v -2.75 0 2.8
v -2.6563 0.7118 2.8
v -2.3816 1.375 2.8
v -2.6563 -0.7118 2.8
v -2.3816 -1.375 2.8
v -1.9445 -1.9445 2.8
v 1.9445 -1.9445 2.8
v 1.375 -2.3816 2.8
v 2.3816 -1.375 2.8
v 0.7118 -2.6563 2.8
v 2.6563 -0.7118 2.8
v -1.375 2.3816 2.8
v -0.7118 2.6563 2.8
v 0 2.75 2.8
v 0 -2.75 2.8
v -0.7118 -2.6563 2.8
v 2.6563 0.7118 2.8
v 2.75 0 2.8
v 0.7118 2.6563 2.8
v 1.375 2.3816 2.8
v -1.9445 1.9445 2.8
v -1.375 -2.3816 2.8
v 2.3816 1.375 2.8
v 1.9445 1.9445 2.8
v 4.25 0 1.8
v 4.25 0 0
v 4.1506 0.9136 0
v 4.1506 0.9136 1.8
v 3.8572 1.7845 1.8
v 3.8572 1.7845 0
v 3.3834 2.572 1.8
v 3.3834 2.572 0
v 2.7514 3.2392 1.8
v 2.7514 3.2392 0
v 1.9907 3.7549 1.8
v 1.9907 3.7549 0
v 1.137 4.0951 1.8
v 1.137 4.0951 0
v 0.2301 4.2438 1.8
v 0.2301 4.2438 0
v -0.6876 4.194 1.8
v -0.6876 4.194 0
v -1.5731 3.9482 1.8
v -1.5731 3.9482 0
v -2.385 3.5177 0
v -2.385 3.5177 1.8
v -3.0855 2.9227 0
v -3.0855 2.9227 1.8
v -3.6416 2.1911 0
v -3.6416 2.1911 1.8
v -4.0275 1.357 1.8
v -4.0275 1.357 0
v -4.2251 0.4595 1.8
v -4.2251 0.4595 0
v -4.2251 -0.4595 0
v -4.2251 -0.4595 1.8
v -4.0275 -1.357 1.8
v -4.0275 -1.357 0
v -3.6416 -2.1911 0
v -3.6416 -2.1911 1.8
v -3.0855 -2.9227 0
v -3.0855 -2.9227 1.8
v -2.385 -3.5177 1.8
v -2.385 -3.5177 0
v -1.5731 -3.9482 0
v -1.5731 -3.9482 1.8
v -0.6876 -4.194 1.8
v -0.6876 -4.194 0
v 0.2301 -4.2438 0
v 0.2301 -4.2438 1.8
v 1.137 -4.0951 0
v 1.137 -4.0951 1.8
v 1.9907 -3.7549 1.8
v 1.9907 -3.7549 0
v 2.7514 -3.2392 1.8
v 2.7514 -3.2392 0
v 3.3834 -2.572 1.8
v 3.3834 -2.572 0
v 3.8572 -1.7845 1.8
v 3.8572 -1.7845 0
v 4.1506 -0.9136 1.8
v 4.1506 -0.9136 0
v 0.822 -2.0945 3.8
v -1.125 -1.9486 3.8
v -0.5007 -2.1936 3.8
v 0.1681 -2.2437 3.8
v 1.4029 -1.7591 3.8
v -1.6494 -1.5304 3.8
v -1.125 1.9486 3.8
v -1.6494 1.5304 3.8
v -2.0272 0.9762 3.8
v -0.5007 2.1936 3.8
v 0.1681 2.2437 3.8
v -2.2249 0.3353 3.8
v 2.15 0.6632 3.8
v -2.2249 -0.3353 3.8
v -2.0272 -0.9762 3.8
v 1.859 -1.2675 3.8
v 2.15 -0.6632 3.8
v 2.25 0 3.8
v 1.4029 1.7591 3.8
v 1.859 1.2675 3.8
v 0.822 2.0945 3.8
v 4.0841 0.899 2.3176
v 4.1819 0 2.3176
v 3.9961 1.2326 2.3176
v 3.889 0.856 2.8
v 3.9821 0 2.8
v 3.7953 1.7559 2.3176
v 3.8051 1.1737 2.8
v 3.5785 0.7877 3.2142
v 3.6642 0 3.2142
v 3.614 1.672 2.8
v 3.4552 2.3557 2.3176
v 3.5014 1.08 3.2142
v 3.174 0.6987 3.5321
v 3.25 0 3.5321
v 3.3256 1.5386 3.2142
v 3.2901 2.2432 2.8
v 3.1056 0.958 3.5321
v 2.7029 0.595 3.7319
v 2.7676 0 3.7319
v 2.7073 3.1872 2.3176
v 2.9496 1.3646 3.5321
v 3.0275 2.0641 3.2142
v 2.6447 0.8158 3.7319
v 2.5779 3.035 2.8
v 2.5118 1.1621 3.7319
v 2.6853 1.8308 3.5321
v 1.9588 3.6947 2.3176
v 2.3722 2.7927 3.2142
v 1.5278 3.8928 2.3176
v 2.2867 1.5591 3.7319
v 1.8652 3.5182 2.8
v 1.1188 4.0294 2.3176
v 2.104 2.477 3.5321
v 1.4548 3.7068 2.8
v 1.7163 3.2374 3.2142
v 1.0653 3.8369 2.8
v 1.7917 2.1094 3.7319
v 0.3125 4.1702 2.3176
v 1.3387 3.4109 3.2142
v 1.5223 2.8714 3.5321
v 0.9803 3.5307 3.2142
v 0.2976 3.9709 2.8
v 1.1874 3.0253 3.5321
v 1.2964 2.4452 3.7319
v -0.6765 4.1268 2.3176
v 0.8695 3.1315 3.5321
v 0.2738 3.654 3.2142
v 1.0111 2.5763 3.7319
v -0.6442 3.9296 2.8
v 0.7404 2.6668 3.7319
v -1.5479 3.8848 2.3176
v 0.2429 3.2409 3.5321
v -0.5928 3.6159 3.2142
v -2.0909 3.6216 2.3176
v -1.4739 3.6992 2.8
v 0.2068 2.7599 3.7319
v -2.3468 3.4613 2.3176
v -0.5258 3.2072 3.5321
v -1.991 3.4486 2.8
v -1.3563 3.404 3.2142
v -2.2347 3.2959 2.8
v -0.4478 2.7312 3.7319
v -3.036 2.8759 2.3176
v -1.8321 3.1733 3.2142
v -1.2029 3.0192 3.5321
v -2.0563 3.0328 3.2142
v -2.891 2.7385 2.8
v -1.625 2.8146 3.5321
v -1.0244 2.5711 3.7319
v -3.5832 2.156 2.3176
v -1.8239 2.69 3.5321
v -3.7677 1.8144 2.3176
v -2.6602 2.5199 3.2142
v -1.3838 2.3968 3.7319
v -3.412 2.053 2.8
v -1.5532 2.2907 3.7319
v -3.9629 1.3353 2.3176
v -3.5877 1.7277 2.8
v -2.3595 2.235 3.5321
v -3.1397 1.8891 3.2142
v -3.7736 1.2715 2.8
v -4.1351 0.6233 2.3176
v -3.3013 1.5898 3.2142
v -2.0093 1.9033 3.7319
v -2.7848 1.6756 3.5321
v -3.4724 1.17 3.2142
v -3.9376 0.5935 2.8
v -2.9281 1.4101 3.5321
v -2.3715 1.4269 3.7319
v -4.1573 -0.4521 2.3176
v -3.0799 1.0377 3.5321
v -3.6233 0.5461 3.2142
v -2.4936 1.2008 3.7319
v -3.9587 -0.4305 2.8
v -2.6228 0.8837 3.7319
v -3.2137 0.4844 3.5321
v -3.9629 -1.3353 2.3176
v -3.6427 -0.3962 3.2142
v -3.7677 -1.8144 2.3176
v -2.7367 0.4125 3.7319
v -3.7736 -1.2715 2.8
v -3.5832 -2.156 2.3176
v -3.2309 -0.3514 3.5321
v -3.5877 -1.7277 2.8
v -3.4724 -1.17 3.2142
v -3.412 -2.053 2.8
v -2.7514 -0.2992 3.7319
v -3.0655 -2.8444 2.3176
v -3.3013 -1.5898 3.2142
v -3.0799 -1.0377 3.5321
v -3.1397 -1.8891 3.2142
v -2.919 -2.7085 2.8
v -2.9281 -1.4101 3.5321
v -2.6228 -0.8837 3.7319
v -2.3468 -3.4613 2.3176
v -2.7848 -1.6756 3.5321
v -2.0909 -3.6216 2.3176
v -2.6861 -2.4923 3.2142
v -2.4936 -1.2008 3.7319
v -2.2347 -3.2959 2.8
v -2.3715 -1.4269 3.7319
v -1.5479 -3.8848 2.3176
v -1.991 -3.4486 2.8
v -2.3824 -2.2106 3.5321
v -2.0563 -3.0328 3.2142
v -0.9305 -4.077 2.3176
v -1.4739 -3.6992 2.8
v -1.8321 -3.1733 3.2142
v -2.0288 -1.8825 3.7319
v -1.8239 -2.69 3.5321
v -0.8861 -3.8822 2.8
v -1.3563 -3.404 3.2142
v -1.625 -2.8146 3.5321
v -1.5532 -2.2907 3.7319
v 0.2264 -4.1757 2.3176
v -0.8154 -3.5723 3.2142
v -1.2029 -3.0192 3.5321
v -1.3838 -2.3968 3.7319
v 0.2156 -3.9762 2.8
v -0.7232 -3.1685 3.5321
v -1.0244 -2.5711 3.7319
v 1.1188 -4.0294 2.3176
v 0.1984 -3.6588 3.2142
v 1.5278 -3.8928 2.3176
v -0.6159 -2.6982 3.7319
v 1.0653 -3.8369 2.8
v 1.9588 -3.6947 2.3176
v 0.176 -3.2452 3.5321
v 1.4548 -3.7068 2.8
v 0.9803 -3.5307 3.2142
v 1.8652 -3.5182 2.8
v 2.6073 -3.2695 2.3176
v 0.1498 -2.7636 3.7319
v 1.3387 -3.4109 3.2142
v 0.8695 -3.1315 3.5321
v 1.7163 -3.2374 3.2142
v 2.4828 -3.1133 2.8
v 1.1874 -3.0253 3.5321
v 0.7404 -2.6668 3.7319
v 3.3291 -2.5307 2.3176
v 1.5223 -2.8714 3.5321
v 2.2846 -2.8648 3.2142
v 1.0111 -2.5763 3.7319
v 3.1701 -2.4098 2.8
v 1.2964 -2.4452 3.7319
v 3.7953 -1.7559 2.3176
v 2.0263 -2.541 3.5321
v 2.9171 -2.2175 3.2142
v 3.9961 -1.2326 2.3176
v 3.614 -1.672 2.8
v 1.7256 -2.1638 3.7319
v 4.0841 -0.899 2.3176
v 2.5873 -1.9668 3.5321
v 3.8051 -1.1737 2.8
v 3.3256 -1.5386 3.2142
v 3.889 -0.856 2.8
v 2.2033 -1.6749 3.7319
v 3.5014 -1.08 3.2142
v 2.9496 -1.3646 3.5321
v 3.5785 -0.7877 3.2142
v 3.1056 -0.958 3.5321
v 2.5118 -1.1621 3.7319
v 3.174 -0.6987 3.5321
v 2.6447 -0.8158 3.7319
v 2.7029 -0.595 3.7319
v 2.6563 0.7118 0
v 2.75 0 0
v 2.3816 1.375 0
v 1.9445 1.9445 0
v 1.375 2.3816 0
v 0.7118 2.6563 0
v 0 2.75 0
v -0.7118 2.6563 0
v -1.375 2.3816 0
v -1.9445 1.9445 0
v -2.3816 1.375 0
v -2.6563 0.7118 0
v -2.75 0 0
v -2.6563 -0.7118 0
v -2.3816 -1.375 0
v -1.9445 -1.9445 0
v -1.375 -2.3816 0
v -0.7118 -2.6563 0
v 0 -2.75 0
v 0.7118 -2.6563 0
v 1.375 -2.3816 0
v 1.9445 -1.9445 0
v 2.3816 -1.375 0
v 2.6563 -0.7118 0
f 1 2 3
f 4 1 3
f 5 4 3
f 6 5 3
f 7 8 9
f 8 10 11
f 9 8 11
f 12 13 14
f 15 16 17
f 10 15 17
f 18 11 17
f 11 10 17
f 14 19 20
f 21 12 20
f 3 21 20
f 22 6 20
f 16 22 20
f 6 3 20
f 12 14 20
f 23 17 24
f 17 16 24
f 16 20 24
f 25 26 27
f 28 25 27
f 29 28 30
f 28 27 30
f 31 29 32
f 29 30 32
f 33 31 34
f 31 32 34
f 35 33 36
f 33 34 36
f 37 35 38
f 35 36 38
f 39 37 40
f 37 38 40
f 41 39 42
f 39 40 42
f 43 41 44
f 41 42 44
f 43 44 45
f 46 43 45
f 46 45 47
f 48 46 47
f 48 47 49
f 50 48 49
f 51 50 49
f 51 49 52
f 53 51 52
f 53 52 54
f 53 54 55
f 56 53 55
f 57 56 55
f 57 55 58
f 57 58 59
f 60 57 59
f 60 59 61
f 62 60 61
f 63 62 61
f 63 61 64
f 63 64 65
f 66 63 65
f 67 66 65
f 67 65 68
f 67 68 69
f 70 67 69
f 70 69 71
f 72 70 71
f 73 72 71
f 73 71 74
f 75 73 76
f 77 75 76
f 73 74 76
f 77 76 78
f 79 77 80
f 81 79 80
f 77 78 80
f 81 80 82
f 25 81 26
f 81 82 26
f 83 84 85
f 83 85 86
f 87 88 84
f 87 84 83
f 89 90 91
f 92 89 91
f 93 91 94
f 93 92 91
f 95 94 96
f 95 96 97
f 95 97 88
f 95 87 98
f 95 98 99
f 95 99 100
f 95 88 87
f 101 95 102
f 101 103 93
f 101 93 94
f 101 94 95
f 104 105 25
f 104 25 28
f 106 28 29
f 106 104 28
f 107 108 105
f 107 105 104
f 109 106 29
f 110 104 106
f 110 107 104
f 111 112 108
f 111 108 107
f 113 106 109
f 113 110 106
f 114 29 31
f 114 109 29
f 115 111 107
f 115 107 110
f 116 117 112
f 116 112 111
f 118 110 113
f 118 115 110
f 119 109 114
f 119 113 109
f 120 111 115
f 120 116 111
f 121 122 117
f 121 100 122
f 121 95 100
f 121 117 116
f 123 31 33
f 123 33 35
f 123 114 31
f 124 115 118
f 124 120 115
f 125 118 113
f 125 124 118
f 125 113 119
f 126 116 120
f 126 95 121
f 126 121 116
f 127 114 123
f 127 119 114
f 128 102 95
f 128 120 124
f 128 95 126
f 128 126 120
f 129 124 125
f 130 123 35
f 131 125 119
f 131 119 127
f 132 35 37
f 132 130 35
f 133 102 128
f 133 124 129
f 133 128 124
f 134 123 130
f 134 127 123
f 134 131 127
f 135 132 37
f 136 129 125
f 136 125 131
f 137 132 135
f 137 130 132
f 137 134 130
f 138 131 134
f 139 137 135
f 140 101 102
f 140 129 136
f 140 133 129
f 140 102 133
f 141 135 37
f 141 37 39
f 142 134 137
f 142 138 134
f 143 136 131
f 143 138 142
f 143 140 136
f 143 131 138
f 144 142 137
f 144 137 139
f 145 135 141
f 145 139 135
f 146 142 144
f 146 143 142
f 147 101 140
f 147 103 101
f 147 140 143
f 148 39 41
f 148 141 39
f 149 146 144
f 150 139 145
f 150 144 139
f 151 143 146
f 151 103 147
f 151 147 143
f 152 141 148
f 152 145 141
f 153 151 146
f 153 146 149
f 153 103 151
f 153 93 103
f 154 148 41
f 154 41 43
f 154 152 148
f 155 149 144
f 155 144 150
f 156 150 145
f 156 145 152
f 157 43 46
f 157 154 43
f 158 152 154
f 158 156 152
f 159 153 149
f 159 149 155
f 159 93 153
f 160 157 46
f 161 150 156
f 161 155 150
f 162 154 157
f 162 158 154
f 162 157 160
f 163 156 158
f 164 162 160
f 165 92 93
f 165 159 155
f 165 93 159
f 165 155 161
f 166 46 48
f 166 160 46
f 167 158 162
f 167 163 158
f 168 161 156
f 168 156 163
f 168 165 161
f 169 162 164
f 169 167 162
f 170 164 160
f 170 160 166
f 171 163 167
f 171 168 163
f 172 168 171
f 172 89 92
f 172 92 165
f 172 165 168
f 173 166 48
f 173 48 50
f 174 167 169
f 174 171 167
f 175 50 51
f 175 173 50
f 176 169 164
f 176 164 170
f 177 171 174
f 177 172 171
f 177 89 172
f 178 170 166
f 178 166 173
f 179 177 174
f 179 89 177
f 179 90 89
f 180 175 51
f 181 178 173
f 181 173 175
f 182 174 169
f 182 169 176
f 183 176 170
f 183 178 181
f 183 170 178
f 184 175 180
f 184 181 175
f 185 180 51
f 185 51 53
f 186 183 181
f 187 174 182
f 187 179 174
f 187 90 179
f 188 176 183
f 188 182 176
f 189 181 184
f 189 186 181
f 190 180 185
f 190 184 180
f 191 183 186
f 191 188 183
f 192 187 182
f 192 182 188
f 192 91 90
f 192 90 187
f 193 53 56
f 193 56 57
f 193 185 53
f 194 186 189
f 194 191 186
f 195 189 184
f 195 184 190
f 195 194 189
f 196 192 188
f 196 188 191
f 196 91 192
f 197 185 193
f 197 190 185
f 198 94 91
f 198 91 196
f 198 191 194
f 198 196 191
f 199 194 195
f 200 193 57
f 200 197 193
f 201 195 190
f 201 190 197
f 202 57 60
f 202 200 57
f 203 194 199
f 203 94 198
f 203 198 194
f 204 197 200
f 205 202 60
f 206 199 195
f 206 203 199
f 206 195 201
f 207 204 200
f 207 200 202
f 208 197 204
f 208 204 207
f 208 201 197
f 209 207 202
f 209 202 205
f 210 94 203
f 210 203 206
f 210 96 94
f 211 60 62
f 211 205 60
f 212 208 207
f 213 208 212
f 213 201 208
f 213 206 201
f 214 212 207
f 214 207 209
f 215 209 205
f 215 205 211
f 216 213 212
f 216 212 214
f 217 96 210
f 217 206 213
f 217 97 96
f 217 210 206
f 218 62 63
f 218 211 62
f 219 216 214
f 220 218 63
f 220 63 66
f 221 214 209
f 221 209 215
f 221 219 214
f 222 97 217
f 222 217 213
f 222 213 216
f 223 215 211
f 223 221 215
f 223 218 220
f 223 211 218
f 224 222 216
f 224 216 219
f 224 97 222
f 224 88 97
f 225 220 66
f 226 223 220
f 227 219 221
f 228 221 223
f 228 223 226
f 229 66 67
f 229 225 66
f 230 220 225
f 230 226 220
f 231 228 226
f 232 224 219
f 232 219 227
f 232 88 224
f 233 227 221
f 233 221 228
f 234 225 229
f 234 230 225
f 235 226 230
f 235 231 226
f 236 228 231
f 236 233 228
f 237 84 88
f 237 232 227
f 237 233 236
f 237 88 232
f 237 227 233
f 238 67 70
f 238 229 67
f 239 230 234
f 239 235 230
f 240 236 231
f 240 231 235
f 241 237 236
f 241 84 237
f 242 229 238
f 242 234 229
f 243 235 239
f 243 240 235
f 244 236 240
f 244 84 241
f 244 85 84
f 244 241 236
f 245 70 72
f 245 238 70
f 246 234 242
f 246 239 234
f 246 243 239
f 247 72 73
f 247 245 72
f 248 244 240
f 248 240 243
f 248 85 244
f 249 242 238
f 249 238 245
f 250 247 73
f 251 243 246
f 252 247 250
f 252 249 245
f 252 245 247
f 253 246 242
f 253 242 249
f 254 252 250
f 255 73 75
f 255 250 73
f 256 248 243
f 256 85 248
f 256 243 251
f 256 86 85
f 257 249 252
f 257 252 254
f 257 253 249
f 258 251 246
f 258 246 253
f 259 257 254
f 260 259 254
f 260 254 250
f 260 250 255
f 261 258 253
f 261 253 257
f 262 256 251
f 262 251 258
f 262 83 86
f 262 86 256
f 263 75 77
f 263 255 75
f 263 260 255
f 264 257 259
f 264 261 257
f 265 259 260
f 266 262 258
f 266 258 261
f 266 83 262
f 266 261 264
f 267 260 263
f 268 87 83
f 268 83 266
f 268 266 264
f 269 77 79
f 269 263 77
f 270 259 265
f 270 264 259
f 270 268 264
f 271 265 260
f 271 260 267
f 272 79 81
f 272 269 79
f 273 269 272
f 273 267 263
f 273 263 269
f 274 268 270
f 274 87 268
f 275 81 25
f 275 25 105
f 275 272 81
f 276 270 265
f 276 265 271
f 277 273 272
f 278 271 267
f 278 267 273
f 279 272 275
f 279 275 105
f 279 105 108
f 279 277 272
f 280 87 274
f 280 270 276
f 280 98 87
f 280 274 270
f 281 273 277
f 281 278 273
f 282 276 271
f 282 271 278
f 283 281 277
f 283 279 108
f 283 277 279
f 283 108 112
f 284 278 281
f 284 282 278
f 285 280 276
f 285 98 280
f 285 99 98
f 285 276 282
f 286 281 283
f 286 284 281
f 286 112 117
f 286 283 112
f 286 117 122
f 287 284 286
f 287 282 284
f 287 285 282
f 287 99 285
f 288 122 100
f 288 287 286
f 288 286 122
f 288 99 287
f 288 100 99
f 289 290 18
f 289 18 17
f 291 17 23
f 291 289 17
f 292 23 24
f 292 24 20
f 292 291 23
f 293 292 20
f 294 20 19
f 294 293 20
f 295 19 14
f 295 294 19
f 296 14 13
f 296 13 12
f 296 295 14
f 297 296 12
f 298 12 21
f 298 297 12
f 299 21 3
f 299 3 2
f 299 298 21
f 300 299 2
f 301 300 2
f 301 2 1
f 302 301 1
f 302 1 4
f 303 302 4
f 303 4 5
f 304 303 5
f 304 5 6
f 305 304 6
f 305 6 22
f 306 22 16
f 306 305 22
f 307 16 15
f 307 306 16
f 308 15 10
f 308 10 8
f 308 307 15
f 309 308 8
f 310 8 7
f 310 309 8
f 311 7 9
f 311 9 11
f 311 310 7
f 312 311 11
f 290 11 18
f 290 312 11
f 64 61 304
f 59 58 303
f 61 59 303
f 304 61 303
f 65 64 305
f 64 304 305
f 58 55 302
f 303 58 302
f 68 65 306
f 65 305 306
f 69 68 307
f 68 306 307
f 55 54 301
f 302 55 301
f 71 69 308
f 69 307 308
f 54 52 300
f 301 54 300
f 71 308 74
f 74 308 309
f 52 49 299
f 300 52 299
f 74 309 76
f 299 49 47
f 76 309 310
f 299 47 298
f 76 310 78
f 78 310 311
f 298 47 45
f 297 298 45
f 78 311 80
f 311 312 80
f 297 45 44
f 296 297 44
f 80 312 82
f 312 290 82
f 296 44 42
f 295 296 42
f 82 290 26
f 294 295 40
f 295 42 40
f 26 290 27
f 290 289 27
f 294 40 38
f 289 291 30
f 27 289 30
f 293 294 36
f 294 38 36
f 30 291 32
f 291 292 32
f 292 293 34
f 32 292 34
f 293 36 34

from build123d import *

# Parameters (mm, degrees)
SCHIZZO1_R                   = 4.25
SCHIZZO1_R_2                 = 2.75
ESTRUSIONE_ESTRUSIONE1_DEPTH = 2.8
SCHIZZO2_R                   = 4.25
ESTRUSIONE_ESTRUSIONE2_DEPTH = 1
RACCORDO1_R                  = 2


with BuildPart() as part:
    # Schizzo1 → Estrusione-Estrusione1 (new body)
    with BuildSketch(Plane.XY):
        Circle(SCHIZZO1_R)
        Circle(SCHIZZO1_R_2, mode=Mode.SUBTRACT)
    extrude(amount=ESTRUSIONE_ESTRUSIONE1_DEPTH)

    # Schizzo2 → Estrusione-Estrusione2 (add)
    with BuildSketch(Plane.XY.offset(2.8)):
        Circle(SCHIZZO2_R)
    extrude(amount=ESTRUSIONE_ESTRUSIONE2_DEPTH)

    # Raccordo1
    raccordo1_edges = [part.edges().sort_by_distance(p)[0] for p in [
        (-4.25, 0, 3.8),
    ]]
    fillet(raccordo1_edges, radius=RACCORDO1_R)


solid = part.part
